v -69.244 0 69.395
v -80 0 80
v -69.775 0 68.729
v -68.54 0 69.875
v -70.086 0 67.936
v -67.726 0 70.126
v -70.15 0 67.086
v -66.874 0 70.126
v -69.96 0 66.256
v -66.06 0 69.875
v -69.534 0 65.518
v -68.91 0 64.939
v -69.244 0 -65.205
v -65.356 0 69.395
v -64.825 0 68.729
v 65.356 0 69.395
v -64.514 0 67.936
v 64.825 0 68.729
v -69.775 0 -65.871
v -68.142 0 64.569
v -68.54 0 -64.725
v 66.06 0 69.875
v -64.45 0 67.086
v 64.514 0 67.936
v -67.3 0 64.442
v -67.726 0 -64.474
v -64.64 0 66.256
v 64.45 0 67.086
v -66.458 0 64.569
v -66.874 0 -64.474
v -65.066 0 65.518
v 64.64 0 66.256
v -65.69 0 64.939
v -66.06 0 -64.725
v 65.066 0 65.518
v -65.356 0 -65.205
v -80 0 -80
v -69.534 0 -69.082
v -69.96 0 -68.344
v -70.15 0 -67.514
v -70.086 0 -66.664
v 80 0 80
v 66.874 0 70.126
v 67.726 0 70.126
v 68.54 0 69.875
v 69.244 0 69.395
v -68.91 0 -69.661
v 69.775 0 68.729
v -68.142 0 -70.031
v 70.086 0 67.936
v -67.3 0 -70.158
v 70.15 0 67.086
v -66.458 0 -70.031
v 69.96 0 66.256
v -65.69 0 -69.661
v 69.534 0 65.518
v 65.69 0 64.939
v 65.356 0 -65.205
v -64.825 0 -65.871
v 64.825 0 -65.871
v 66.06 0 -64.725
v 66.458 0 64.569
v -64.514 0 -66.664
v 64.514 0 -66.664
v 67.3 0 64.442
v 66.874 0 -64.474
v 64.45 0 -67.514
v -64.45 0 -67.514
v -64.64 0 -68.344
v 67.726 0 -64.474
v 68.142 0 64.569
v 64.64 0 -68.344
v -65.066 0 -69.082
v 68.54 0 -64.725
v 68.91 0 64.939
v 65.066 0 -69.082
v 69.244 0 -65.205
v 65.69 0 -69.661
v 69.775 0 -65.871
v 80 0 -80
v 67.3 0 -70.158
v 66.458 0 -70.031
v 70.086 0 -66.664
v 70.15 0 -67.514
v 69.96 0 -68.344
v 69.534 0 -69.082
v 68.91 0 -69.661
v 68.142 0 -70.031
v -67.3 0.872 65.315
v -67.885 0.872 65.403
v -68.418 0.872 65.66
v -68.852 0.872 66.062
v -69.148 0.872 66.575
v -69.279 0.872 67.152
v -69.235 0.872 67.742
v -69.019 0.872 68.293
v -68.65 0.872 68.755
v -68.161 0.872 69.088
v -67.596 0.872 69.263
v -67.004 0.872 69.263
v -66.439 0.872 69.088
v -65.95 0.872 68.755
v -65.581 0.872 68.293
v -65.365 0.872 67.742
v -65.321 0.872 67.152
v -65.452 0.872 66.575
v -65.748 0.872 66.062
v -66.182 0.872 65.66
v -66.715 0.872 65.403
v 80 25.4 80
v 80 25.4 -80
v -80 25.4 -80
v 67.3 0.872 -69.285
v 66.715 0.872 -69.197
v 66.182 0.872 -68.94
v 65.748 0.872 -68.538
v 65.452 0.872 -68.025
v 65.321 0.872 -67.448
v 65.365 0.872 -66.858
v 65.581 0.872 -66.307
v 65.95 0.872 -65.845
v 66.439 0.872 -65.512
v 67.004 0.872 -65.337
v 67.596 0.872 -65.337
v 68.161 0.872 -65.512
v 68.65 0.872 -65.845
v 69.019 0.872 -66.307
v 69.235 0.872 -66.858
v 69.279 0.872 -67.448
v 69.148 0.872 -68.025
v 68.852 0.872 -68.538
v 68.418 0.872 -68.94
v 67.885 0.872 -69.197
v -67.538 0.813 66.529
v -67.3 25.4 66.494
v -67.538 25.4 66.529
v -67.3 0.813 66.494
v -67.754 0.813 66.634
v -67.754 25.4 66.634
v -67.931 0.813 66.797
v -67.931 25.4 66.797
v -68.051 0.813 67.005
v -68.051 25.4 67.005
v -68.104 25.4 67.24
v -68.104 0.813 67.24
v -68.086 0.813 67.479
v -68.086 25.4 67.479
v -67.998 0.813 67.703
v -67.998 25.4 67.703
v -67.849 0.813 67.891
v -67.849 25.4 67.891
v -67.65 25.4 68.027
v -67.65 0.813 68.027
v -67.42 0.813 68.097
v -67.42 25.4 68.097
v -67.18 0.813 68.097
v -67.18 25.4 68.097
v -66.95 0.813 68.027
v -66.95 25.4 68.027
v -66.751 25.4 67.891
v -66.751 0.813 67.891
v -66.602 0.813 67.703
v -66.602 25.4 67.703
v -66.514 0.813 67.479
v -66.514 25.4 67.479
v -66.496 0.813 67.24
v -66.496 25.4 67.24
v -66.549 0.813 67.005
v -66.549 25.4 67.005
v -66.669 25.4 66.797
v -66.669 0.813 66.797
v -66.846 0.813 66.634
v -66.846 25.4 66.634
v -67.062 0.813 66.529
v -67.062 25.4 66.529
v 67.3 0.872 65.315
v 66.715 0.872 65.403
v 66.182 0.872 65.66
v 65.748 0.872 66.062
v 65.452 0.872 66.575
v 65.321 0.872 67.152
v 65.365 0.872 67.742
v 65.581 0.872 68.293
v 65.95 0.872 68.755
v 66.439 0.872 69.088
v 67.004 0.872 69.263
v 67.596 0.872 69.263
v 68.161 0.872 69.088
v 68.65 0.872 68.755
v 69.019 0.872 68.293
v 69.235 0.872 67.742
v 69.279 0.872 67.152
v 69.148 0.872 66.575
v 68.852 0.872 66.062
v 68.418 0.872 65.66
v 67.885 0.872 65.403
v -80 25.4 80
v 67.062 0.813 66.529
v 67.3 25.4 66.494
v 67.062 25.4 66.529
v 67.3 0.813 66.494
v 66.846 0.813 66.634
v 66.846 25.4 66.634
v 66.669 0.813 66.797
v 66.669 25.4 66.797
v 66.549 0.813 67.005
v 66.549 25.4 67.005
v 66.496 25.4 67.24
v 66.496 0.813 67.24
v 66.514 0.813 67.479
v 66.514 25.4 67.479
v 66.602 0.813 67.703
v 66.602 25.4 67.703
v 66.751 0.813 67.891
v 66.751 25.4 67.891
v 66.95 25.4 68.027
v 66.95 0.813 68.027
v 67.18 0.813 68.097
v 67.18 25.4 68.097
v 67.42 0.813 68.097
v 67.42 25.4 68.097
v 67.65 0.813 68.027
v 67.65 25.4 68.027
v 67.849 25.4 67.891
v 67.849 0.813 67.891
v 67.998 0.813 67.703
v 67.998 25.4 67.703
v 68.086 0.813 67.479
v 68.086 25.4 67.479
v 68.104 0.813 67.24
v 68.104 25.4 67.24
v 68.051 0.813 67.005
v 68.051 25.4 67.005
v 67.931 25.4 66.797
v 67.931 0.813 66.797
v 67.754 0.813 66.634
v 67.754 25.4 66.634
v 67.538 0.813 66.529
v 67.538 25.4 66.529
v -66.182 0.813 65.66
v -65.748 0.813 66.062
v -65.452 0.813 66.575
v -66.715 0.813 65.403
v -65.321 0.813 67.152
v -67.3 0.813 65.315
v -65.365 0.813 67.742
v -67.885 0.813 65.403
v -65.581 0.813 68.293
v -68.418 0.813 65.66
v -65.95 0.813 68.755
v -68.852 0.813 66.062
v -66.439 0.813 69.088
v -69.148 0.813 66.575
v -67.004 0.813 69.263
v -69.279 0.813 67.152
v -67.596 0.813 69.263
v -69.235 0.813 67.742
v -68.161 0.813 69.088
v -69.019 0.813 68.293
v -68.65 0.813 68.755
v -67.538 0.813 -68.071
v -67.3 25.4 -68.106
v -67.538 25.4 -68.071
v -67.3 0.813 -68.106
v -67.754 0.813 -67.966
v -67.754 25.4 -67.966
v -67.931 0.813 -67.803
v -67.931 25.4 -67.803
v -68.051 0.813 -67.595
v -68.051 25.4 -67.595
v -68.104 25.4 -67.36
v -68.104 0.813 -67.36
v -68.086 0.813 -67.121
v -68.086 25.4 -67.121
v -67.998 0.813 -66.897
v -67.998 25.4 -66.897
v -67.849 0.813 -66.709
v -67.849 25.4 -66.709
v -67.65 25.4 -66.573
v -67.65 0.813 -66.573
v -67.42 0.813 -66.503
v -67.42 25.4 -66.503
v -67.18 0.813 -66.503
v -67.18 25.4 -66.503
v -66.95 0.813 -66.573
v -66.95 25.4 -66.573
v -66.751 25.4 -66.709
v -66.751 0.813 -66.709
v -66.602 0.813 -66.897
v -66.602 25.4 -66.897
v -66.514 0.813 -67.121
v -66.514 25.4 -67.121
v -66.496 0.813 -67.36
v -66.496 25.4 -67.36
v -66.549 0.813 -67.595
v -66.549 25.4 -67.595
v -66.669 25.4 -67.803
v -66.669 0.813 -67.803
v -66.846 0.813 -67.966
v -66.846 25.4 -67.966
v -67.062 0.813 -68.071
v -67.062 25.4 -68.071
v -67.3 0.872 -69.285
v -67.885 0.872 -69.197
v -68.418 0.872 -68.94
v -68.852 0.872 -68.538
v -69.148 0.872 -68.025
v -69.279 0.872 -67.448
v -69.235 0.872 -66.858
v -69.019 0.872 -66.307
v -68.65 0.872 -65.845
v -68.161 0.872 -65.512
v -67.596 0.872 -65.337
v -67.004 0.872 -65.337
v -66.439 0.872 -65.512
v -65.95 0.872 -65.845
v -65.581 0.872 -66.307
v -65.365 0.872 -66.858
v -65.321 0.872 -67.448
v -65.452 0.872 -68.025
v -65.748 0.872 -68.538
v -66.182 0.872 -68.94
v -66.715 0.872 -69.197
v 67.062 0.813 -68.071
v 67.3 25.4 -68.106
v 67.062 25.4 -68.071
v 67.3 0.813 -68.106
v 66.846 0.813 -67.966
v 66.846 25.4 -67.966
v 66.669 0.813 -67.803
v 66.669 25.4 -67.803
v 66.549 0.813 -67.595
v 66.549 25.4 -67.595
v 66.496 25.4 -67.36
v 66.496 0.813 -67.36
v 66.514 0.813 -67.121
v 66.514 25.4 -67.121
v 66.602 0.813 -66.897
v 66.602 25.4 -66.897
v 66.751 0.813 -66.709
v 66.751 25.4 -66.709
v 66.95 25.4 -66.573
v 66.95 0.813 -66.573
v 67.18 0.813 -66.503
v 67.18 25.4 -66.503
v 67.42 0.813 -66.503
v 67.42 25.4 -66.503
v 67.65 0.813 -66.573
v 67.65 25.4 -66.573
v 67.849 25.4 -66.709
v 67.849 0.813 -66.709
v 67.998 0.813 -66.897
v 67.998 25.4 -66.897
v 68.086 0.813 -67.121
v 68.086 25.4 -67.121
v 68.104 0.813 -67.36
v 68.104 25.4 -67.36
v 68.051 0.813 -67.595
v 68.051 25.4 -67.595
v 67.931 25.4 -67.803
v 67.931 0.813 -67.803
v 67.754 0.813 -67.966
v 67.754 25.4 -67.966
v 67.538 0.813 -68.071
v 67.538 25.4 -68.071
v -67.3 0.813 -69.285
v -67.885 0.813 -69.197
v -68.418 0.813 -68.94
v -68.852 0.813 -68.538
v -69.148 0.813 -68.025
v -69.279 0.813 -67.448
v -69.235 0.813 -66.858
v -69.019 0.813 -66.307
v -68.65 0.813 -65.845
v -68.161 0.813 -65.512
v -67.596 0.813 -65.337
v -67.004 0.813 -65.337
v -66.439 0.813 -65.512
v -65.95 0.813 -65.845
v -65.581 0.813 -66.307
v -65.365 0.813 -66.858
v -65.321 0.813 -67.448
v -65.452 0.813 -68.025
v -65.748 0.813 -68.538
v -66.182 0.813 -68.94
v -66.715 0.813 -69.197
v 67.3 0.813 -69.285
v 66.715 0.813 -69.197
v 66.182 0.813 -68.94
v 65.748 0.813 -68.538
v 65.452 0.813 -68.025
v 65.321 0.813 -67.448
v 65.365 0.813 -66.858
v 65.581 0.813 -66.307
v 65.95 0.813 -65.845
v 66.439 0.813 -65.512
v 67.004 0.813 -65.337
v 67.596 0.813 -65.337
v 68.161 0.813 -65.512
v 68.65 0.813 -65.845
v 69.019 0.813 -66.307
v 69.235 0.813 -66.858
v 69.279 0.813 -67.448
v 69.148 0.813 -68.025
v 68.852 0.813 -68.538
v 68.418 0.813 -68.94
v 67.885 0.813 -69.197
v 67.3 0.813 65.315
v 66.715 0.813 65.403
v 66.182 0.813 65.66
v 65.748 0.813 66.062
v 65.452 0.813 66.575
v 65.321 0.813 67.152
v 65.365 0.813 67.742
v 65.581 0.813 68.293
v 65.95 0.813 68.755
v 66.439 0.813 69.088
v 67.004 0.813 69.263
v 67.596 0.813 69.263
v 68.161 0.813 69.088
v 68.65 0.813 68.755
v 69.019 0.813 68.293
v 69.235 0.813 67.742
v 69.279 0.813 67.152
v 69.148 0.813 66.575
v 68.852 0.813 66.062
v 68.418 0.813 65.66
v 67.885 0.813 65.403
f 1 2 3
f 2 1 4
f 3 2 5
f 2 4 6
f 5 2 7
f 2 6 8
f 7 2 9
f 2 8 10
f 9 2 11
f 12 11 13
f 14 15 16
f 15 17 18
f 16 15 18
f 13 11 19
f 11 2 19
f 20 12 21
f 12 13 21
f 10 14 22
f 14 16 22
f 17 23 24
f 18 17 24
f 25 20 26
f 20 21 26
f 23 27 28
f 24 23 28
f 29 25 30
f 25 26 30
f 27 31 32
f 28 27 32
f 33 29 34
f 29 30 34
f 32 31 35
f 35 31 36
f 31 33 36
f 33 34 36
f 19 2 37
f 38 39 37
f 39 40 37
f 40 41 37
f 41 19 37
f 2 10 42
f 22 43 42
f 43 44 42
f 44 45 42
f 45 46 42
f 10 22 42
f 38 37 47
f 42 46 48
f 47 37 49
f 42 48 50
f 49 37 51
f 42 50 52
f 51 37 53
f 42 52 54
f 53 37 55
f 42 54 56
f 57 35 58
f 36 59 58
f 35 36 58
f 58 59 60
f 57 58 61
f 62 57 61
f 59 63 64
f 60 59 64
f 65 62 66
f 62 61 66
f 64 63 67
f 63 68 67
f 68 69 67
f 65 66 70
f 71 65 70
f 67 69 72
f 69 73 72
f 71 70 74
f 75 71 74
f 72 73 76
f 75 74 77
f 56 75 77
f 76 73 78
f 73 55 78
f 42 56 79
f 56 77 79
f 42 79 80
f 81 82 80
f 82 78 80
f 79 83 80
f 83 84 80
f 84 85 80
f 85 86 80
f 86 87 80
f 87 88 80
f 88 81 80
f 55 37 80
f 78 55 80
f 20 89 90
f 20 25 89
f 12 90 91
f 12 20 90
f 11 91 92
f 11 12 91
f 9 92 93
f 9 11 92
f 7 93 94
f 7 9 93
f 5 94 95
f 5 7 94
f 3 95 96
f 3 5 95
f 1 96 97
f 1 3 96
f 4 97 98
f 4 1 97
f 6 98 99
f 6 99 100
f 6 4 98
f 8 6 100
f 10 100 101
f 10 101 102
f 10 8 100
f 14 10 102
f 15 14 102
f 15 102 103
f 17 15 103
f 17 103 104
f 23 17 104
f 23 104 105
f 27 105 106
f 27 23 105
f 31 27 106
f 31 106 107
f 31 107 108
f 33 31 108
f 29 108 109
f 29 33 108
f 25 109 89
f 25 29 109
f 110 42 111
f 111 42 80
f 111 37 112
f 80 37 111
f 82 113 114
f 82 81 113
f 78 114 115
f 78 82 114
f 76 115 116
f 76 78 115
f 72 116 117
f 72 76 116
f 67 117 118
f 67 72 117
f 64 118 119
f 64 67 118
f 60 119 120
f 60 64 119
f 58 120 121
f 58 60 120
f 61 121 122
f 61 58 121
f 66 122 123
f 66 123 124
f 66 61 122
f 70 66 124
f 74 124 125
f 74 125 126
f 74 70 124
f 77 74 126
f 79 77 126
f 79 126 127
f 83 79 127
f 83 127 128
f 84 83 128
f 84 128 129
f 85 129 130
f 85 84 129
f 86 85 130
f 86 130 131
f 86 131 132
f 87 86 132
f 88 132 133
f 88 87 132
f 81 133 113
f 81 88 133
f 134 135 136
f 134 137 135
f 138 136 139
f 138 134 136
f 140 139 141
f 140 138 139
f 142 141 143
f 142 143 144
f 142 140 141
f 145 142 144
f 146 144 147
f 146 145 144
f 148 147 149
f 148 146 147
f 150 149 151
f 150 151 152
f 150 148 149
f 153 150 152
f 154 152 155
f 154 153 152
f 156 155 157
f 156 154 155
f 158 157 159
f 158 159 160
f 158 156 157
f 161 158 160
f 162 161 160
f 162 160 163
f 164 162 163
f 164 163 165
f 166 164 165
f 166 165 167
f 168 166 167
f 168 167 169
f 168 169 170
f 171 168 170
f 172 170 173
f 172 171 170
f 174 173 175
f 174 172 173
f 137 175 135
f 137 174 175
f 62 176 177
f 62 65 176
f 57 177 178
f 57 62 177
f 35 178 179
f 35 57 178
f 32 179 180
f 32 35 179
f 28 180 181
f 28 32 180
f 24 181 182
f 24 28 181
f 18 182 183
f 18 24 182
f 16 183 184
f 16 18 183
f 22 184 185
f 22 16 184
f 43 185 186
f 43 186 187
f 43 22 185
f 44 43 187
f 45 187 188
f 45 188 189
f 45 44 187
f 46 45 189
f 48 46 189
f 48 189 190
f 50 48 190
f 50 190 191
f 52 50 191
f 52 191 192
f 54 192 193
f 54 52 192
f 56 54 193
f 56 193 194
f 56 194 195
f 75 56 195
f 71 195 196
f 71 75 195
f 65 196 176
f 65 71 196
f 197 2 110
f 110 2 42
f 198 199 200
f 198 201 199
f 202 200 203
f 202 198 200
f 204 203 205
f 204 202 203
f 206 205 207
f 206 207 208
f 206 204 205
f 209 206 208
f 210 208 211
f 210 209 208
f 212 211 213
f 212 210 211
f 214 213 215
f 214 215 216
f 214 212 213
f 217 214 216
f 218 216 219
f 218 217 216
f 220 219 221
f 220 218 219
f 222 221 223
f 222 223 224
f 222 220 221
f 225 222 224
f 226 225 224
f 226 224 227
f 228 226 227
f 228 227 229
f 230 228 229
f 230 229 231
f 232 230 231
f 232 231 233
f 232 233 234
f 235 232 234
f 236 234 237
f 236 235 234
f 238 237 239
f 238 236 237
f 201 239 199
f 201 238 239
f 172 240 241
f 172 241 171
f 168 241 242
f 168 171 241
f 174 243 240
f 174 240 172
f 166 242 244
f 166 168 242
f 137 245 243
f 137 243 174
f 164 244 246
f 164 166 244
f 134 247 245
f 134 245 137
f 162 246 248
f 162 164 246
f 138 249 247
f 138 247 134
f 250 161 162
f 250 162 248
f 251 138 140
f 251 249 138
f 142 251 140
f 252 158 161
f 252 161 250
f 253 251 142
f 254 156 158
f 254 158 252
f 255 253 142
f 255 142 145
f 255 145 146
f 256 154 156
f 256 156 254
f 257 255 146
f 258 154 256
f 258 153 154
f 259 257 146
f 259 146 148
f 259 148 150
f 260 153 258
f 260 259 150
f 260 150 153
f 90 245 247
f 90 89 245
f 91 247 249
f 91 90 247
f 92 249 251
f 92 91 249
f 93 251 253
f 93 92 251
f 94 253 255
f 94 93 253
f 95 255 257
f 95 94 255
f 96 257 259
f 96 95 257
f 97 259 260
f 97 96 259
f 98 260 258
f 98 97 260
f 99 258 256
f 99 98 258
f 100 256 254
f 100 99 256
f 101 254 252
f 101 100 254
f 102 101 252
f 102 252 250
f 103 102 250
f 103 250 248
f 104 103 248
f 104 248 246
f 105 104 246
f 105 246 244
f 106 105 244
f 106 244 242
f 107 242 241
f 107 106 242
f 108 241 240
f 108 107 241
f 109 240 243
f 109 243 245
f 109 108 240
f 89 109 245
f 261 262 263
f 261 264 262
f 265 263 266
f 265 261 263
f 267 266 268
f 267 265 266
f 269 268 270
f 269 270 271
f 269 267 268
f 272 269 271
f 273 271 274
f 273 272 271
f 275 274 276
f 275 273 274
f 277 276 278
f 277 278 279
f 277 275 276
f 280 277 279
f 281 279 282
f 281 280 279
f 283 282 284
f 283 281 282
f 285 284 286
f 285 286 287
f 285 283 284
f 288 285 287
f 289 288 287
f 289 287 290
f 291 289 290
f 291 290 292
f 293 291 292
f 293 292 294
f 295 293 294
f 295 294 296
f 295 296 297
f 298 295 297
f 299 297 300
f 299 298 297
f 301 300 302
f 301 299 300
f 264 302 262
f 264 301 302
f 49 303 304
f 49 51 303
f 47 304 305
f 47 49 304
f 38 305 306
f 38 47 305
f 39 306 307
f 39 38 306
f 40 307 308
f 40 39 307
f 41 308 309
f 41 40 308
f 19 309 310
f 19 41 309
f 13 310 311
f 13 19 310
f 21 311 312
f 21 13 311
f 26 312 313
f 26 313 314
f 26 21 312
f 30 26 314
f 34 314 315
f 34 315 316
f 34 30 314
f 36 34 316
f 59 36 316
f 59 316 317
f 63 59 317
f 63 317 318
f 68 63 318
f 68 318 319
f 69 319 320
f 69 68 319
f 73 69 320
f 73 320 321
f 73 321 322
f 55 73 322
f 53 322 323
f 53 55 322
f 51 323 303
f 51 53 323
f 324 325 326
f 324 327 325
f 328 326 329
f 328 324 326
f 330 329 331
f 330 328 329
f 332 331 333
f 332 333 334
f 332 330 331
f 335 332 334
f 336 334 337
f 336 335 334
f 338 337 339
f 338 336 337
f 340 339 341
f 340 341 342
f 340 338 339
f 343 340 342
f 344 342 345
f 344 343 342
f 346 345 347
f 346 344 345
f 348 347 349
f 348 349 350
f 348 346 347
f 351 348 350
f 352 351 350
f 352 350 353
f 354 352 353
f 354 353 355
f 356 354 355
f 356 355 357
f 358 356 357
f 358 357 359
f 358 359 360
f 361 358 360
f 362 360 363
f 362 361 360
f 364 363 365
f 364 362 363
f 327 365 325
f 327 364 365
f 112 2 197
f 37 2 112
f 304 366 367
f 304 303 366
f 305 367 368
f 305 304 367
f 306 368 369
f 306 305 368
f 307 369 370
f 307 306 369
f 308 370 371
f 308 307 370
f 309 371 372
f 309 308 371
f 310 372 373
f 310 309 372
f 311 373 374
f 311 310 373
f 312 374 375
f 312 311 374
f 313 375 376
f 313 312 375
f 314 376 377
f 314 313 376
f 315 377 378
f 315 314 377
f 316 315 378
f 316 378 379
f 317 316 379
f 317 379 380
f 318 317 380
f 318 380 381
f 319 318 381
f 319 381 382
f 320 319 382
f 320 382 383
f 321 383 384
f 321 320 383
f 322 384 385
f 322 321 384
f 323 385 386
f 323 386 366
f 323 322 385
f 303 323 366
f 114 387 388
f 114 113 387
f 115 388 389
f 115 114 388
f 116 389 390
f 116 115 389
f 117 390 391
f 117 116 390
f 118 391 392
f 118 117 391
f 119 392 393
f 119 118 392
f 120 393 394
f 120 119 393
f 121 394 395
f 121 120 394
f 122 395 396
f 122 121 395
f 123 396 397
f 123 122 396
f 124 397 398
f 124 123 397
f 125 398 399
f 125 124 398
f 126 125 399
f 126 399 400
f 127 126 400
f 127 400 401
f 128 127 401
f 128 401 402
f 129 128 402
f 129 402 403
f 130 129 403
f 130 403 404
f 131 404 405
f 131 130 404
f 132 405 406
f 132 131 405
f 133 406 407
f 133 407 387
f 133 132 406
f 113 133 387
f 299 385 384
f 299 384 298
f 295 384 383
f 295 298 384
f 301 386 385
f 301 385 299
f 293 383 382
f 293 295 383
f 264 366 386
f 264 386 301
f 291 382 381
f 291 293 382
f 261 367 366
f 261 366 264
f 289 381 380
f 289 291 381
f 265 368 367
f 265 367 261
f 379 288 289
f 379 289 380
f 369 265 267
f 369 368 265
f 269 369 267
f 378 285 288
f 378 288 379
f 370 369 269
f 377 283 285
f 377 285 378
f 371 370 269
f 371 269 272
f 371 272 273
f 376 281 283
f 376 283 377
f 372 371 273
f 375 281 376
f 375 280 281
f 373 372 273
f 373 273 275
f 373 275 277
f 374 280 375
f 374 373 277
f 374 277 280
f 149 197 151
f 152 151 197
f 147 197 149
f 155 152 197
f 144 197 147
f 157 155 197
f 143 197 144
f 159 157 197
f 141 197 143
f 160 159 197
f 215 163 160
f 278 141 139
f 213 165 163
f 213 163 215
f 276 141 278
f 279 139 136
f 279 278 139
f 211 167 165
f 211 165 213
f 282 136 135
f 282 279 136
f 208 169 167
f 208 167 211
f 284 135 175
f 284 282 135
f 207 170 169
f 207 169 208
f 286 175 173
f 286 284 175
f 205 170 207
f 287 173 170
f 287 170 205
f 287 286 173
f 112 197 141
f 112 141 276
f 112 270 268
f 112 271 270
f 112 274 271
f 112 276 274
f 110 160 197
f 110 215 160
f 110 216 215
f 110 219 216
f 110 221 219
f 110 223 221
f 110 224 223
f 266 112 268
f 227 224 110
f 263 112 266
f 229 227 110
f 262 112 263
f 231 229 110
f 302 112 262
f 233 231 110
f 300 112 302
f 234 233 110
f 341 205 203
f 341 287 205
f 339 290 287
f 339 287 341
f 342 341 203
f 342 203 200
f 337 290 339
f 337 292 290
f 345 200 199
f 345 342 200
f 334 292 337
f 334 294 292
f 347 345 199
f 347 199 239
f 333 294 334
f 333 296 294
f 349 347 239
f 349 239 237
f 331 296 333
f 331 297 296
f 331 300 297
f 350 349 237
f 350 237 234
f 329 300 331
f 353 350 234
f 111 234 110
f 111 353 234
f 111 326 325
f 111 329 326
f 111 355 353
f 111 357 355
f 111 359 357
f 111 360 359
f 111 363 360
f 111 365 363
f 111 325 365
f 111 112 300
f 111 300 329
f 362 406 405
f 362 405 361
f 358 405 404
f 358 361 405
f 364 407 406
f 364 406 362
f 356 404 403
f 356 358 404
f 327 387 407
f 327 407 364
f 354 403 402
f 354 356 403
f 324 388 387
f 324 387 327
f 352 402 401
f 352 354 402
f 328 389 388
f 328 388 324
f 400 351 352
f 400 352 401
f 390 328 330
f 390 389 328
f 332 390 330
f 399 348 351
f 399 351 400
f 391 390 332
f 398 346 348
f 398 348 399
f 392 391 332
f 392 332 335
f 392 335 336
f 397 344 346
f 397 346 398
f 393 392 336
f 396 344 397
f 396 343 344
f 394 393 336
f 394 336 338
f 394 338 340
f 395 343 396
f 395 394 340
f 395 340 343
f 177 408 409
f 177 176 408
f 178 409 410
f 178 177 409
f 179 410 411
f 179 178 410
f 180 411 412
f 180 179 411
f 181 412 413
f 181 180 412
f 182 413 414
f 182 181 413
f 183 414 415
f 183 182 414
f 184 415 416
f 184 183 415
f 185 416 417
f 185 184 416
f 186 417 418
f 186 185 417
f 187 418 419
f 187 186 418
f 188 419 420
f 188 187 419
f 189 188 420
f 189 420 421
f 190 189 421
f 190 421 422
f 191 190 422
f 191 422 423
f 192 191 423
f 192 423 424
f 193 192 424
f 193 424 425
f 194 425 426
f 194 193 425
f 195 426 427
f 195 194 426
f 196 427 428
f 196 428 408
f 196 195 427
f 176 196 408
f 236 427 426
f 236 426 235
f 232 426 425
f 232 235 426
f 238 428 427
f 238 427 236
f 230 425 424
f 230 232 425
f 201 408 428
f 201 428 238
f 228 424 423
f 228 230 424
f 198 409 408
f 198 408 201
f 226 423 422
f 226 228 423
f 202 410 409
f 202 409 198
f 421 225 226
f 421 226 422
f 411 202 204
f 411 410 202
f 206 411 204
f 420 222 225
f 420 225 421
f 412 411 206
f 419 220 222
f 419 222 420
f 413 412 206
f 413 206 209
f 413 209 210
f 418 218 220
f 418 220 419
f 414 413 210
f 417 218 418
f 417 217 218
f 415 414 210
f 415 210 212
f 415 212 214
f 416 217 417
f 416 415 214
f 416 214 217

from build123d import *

# Parameters (mm, degrees)
SKETCH1_W                                   = 160
SKETCH1_H                                   = 160
BOSS_EXTRUDE1_DEPTH                         = 25.4
CBORE_FOR_0_BINDING_HEAD_MACHINE_SC_2_COUNT = 2
CBORE_FOR_0_BINDING_HEAD_MACHINE_SC_2_PITCH = 134.6
CBORE_FOR_0_BINDING_HEAD_MACHINE_SC_3_COUNT = 2
CBORE_FOR_0_BINDING_HEAD_MACHINE_SC_3_PITCH = 190.353145495
CBORE_FOR_0_BINDING_HEAD_MACHINE_SC_4_COUNT = 2
CBORE_FOR_0_BINDING_HEAD_MACHINE_SC_4_PITCH = 134.6


with BuildPart() as part:
    # Sketch1 → Boss-Extrude1 (new body)
    with BuildSketch(Plane(origin=(0, 0, 0), x_dir=(1, 0, 0), z_dir=(0, 1, 0))):
        Rectangle(SKETCH1_W, SKETCH1_H)
    extrude(amount=BOSS_EXTRUDE1_DEPTH)

    # Sketch3 → CBORE for #0 Binding Head Machine Screw1 (revolve, cut)
    with BuildSketch(Plane(origin=(-67.3, 0, -67.3), x_dir=(0, 0, -1), z_dir=(1, 0, 0))):
        Polygon((0, 0), (0, 25.4), (0.80645, 25.4), (0.80645, 0.8128), (1.98501, 0.8128), (1.98501, 0.87249), (2.8575, 0), align=None)
    cbore_for_0_binding_head_machine_screw1 = revolve(axis=Axis((-67.3, -6.35, -67.3), (0, 1, 0)), mode=Mode.SUBTRACT)

    # CBORE for _0 Binding Head Machine Sc 2: CBORE for #0 Binding Head Machine Screw1 ×2
    with Locations(*[(i * CBORE_FOR_0_BINDING_HEAD_MACHINE_SC_2_PITCH, 0, 0) for i in range(1, CBORE_FOR_0_BINDING_HEAD_MACHINE_SC_2_COUNT)]):
        add(cbore_for_0_binding_head_machine_screw1, mode=Mode.SUBTRACT)

    # CBORE for _0 Binding Head Machine Sc 3: CBORE for #0 Binding Head Machine Screw1 ×2
    with Locations(*[Vector(0.7071067811865475, 0, 0.7071067811865476) * (i * CBORE_FOR_0_BINDING_HEAD_MACHINE_SC_3_PITCH) for i in range(1, CBORE_FOR_0_BINDING_HEAD_MACHINE_SC_3_COUNT)]):
        add(cbore_for_0_binding_head_machine_screw1, mode=Mode.SUBTRACT)

    # CBORE for _0 Binding Head Machine Sc 4: CBORE for #0 Binding Head Machine Screw1 ×2
    with Locations(*[(0, 0, i * CBORE_FOR_0_BINDING_HEAD_MACHINE_SC_4_PITCH) for i in range(1, CBORE_FOR_0_BINDING_HEAD_MACHINE_SC_4_COUNT)]):
        add(cbore_for_0_binding_head_machine_screw1, mode=Mode.SUBTRACT)


solid = part.part
